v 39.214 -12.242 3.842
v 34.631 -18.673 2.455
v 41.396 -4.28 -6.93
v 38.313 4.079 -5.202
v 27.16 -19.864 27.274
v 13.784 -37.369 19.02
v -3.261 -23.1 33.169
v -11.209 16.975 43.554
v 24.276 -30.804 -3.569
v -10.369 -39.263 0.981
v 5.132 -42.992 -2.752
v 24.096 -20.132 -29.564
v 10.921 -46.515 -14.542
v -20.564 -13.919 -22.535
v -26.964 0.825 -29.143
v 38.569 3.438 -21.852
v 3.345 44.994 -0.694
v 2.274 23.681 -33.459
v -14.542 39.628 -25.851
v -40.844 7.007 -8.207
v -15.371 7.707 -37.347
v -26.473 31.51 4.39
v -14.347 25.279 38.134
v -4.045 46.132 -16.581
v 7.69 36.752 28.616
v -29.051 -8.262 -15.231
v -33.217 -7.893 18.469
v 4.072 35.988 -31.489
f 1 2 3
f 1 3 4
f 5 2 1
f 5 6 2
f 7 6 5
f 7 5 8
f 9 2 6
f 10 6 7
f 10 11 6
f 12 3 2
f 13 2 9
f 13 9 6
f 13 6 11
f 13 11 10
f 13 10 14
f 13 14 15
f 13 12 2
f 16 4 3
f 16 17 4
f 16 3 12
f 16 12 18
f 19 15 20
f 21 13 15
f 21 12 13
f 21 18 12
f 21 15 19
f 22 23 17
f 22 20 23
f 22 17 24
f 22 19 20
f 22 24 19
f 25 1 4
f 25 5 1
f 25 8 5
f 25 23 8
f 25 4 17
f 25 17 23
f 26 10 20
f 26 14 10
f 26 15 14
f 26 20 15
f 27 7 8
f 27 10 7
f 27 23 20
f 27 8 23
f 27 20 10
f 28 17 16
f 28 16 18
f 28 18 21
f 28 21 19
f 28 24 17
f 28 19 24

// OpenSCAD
// file: pointhull.scad
function _slice(list,start,end=undef) =
    let(end = end==undef?len(list):end)
    [for(i=[start:1:end-1]) list[i]];
        
function _delete(list,pos) =
    let(l=len(list))
    pos == 0 ? [for(i=[1:1:l-1]) list[i]] :
    pos >= l-1 ? [for(i=[0:1:pos-1]) list[i]] :
    concat([for(i=[0:1:pos-1]) list[i]],
        [for(i=[pos+1:1:l-1]) list[i]]);

function _areCollinear(a,b,c) = cross(b-a,c-a) == [0,0,0];
        
function _areCoplanar(a,b,c,d) = (d-a)*cross(b-a,c-a) == 0;
    
function _findNoncollinear(list,point1,point2,pos=0) = 
    pos >= len(list) ? undef :
    ! _areCollinear(point1,point2,list[pos]) ? pos :
    _findNoncollinear(list,point1,point2,pos=pos+1);
        
function _findNoncoplanar(list,point1,point2,point3,pos=0) =
   pos >= len(list) ? undef :
   ! _areCoplanar(point1,point2,point3,list[pos]) ? pos : 
        _findNoncoplanar(list,point1,point2,point3,pos=pos+1);
        
function _isBoundedBy(a,face,strict=false) =
    let(c = cross(face[1]-face[0],face[2]-face[0])*(a-face[0]))
    strict ? c > 0 : c >= 0;   
        
function _makeTet(a,b,c,d) =
    _isBoundedBy(d,[a,b,c]) ? 
        [[a,b,c],[b,a,d],[c,b,d],[a,c,d]] :
        [[c,b,a],[d,a,b],[d,b,c],[d,c,a]];

function _findTri(list) = 
    let(l2=_unique(list))
    assert(len(list)>=3)
    let(a=list[0],
        b=list[1],
        l3=_slice(list,2),
        ci=_findNoncollinear(l3,a,b),        
        c=assert(ci != undef) l3[ci],
        l4=_delete(l3,ci))
        [[a,b,c],l4];
        
function _findTet(list) =    
    let(ft=_findTri(list),
        tri=ft[0],
        l4=ft[1],
        di=assert(len(l4)>0) _findNoncoplanar(l4,tri[0],tri[1],tri[2]),
        d=assert(di != undef) l4[di],
        l5=_delete(l4,di))
        [_makeTet(tri[0],tri[1],tri[2],d),l5];
    
function find(list,value) =
    let(m=search([value],list,1)[0]) 
    m==[] ? undef : m;
           
function _unique(list,soFar=[],pos=0) =
    pos >= len(list) ? soFar :
    find(soFar,list[pos]) == undef ? _unique(list,soFar=concat(soFar,[list[pos]]),pos=pos+1) :
    _unique(list,soFar=soFar,pos=pos+1);
    
function _makePointsAndFaces(triangles) =
    let(points=_unique([for(t=triangles) for(v=t) v]))
        [points, [for(t=triangles) [for(v=t) find(points,v)]]];

function _sameSide(p1,p2, a,b) = 
    let(cp1 = cross(b-a, p1-a),
        cp2 = cross(b-a, p2-a)) 
        cp1*cp2 >= 0;

function _insideTriangle(p, t) = 
    _sameSide(p,t[0],t[1],t[2]) &&
    _sameSide(p,t[1],t[0],t[2]) &&
    _sameSide(p,t[2],t[0],t[1]);
            
            
// TODO: optimize _isBoundedBy() calls
function _satisfiesConstraint(p, triangle) =
    _isBoundedBy(p, triangle, strict=true) ? true : 
    _isBoundedBy(p, triangle, strict=false) && _insideTriangle(p, triangle);
    
            
function _insidePoly(p, triangles, pos=0) = 
    pos >= len(triangles) ? true :
    !_satisfiesConstraint(p, triangles[pos]) ? false :
    _insidePoly(p, triangles, pos=pos+1);
        
function _haveEdge(triangles, e, pos=0) =
    pos >= len(triangles) ? false :
    e==[triangles[pos][0],triangles[pos][1]] ||
        e==[triangles[pos][1],triangles[pos][2]] ||
        e==[triangles[pos][2],triangles[pos][0]] ? true :
        _haveEdge(triangles, e, pos=pos+1);
        
function _outerEdges(triangles) =
        [for(t=triangles) for(e=[[t[0],t[1]],
                [t[1],t[2]],
                [t[2],t[0]]])
            if ( !_haveEdge(triangles,[e[1],e[0]])) e];
                
function _unlit(triangles, p) = [for(t=triangles) if(_isBoundedBy(p, t)) t];
        
function _addToHull(h, p) = 
    let(unlit = _unlit(h,p),
        edges = _outerEdges(unlit))
        concat(unlit, [for(e=edges) [e[1],e[0],p]]);

function _expandHull(h, points, pos=0) =
    pos >= len(points) ? h :
    !_insidePoly(points[pos],h) ?  _expandHull(_addToHull(h,points[pos]),points,pos=pos+1) :
    _expandHull(h, points, pos=pos+1);
            
function pointHull3D(points) =
    let(ft=_findTet(points))
        _expandHull(ft[0], ft[1]);
        
function _findEdge(edges,point,pos=0) =
    pos >= len(edges) ? undef :
    edges[pos][0] == point ? pos :
    _findEdge(edges,point,pos=pos+1);
        
function _add1Edge(edgesAndSoFar) =
    let(edges=edgesAndSoFar[0],
        soFar=edgesAndSoFar[1],
        index=_findEdge(edges,soFar[len(soFar)-1]))
        assert(index!=undef)
        [_delete(edgesAndSoFar[0],index),concat(edgesAndSoFar[1],[edgesAndSoFar[0][index][1]])];
        
function _traceEdges(edgesAndSoFar) =
    len(edgesAndSoFar[0]) == 0 ? edgesAndSoFar[1] :
    _traceEdges(_add1Edge(edgesAndSoFar));
        
function pointHull2D(points) = 
    let(
        p3d = concat([[0,0,1]], [for(p=points) [p[0],p[1],0]]),
        h = pointHull3D(p3d),
        edges = [for(t=h) if(t[0][2]==1 || t[1][2]==1 || t[2][2]==1)
                t[0][2]==1 ? [t[1],t[2]] : 
                t[1][2]==1 ? [t[2],t[0]] :
                [t[0],t[1]]],
        trace = _traceEdges([edges,[edges[0][0]]])) [for(v=trace) [v[0],v[1]]];
        
module pointHull(points) {
    if (len(points[0])==2) {
        polygon(pointHull2D(points));
    }
    else {
        paf = _makePointsAndFaces(pointHull3D(points));
        polyhedron(points=paf[0],faces=paf[1]);
    }
}
            
//points = [for(i=[0:99]) rands(0,100,3)];
//pointHull(points);
// main file
use <pointhull.scad>;

//<params>
dimension = 3;
maxNumberOfPoints = 100;
seed = 1;
radius = 50;
//</params>

points0 = rands(-radius,radius,dimension*maxNumberOfPoints,seed);
points = [for (i=[0:maxNumberOfPoints-1]) let(p=[for(j=[0:dimension-1]) points0[i*dimension+j]]) if(norm(p)<=radius) p];

pointHull(points);
